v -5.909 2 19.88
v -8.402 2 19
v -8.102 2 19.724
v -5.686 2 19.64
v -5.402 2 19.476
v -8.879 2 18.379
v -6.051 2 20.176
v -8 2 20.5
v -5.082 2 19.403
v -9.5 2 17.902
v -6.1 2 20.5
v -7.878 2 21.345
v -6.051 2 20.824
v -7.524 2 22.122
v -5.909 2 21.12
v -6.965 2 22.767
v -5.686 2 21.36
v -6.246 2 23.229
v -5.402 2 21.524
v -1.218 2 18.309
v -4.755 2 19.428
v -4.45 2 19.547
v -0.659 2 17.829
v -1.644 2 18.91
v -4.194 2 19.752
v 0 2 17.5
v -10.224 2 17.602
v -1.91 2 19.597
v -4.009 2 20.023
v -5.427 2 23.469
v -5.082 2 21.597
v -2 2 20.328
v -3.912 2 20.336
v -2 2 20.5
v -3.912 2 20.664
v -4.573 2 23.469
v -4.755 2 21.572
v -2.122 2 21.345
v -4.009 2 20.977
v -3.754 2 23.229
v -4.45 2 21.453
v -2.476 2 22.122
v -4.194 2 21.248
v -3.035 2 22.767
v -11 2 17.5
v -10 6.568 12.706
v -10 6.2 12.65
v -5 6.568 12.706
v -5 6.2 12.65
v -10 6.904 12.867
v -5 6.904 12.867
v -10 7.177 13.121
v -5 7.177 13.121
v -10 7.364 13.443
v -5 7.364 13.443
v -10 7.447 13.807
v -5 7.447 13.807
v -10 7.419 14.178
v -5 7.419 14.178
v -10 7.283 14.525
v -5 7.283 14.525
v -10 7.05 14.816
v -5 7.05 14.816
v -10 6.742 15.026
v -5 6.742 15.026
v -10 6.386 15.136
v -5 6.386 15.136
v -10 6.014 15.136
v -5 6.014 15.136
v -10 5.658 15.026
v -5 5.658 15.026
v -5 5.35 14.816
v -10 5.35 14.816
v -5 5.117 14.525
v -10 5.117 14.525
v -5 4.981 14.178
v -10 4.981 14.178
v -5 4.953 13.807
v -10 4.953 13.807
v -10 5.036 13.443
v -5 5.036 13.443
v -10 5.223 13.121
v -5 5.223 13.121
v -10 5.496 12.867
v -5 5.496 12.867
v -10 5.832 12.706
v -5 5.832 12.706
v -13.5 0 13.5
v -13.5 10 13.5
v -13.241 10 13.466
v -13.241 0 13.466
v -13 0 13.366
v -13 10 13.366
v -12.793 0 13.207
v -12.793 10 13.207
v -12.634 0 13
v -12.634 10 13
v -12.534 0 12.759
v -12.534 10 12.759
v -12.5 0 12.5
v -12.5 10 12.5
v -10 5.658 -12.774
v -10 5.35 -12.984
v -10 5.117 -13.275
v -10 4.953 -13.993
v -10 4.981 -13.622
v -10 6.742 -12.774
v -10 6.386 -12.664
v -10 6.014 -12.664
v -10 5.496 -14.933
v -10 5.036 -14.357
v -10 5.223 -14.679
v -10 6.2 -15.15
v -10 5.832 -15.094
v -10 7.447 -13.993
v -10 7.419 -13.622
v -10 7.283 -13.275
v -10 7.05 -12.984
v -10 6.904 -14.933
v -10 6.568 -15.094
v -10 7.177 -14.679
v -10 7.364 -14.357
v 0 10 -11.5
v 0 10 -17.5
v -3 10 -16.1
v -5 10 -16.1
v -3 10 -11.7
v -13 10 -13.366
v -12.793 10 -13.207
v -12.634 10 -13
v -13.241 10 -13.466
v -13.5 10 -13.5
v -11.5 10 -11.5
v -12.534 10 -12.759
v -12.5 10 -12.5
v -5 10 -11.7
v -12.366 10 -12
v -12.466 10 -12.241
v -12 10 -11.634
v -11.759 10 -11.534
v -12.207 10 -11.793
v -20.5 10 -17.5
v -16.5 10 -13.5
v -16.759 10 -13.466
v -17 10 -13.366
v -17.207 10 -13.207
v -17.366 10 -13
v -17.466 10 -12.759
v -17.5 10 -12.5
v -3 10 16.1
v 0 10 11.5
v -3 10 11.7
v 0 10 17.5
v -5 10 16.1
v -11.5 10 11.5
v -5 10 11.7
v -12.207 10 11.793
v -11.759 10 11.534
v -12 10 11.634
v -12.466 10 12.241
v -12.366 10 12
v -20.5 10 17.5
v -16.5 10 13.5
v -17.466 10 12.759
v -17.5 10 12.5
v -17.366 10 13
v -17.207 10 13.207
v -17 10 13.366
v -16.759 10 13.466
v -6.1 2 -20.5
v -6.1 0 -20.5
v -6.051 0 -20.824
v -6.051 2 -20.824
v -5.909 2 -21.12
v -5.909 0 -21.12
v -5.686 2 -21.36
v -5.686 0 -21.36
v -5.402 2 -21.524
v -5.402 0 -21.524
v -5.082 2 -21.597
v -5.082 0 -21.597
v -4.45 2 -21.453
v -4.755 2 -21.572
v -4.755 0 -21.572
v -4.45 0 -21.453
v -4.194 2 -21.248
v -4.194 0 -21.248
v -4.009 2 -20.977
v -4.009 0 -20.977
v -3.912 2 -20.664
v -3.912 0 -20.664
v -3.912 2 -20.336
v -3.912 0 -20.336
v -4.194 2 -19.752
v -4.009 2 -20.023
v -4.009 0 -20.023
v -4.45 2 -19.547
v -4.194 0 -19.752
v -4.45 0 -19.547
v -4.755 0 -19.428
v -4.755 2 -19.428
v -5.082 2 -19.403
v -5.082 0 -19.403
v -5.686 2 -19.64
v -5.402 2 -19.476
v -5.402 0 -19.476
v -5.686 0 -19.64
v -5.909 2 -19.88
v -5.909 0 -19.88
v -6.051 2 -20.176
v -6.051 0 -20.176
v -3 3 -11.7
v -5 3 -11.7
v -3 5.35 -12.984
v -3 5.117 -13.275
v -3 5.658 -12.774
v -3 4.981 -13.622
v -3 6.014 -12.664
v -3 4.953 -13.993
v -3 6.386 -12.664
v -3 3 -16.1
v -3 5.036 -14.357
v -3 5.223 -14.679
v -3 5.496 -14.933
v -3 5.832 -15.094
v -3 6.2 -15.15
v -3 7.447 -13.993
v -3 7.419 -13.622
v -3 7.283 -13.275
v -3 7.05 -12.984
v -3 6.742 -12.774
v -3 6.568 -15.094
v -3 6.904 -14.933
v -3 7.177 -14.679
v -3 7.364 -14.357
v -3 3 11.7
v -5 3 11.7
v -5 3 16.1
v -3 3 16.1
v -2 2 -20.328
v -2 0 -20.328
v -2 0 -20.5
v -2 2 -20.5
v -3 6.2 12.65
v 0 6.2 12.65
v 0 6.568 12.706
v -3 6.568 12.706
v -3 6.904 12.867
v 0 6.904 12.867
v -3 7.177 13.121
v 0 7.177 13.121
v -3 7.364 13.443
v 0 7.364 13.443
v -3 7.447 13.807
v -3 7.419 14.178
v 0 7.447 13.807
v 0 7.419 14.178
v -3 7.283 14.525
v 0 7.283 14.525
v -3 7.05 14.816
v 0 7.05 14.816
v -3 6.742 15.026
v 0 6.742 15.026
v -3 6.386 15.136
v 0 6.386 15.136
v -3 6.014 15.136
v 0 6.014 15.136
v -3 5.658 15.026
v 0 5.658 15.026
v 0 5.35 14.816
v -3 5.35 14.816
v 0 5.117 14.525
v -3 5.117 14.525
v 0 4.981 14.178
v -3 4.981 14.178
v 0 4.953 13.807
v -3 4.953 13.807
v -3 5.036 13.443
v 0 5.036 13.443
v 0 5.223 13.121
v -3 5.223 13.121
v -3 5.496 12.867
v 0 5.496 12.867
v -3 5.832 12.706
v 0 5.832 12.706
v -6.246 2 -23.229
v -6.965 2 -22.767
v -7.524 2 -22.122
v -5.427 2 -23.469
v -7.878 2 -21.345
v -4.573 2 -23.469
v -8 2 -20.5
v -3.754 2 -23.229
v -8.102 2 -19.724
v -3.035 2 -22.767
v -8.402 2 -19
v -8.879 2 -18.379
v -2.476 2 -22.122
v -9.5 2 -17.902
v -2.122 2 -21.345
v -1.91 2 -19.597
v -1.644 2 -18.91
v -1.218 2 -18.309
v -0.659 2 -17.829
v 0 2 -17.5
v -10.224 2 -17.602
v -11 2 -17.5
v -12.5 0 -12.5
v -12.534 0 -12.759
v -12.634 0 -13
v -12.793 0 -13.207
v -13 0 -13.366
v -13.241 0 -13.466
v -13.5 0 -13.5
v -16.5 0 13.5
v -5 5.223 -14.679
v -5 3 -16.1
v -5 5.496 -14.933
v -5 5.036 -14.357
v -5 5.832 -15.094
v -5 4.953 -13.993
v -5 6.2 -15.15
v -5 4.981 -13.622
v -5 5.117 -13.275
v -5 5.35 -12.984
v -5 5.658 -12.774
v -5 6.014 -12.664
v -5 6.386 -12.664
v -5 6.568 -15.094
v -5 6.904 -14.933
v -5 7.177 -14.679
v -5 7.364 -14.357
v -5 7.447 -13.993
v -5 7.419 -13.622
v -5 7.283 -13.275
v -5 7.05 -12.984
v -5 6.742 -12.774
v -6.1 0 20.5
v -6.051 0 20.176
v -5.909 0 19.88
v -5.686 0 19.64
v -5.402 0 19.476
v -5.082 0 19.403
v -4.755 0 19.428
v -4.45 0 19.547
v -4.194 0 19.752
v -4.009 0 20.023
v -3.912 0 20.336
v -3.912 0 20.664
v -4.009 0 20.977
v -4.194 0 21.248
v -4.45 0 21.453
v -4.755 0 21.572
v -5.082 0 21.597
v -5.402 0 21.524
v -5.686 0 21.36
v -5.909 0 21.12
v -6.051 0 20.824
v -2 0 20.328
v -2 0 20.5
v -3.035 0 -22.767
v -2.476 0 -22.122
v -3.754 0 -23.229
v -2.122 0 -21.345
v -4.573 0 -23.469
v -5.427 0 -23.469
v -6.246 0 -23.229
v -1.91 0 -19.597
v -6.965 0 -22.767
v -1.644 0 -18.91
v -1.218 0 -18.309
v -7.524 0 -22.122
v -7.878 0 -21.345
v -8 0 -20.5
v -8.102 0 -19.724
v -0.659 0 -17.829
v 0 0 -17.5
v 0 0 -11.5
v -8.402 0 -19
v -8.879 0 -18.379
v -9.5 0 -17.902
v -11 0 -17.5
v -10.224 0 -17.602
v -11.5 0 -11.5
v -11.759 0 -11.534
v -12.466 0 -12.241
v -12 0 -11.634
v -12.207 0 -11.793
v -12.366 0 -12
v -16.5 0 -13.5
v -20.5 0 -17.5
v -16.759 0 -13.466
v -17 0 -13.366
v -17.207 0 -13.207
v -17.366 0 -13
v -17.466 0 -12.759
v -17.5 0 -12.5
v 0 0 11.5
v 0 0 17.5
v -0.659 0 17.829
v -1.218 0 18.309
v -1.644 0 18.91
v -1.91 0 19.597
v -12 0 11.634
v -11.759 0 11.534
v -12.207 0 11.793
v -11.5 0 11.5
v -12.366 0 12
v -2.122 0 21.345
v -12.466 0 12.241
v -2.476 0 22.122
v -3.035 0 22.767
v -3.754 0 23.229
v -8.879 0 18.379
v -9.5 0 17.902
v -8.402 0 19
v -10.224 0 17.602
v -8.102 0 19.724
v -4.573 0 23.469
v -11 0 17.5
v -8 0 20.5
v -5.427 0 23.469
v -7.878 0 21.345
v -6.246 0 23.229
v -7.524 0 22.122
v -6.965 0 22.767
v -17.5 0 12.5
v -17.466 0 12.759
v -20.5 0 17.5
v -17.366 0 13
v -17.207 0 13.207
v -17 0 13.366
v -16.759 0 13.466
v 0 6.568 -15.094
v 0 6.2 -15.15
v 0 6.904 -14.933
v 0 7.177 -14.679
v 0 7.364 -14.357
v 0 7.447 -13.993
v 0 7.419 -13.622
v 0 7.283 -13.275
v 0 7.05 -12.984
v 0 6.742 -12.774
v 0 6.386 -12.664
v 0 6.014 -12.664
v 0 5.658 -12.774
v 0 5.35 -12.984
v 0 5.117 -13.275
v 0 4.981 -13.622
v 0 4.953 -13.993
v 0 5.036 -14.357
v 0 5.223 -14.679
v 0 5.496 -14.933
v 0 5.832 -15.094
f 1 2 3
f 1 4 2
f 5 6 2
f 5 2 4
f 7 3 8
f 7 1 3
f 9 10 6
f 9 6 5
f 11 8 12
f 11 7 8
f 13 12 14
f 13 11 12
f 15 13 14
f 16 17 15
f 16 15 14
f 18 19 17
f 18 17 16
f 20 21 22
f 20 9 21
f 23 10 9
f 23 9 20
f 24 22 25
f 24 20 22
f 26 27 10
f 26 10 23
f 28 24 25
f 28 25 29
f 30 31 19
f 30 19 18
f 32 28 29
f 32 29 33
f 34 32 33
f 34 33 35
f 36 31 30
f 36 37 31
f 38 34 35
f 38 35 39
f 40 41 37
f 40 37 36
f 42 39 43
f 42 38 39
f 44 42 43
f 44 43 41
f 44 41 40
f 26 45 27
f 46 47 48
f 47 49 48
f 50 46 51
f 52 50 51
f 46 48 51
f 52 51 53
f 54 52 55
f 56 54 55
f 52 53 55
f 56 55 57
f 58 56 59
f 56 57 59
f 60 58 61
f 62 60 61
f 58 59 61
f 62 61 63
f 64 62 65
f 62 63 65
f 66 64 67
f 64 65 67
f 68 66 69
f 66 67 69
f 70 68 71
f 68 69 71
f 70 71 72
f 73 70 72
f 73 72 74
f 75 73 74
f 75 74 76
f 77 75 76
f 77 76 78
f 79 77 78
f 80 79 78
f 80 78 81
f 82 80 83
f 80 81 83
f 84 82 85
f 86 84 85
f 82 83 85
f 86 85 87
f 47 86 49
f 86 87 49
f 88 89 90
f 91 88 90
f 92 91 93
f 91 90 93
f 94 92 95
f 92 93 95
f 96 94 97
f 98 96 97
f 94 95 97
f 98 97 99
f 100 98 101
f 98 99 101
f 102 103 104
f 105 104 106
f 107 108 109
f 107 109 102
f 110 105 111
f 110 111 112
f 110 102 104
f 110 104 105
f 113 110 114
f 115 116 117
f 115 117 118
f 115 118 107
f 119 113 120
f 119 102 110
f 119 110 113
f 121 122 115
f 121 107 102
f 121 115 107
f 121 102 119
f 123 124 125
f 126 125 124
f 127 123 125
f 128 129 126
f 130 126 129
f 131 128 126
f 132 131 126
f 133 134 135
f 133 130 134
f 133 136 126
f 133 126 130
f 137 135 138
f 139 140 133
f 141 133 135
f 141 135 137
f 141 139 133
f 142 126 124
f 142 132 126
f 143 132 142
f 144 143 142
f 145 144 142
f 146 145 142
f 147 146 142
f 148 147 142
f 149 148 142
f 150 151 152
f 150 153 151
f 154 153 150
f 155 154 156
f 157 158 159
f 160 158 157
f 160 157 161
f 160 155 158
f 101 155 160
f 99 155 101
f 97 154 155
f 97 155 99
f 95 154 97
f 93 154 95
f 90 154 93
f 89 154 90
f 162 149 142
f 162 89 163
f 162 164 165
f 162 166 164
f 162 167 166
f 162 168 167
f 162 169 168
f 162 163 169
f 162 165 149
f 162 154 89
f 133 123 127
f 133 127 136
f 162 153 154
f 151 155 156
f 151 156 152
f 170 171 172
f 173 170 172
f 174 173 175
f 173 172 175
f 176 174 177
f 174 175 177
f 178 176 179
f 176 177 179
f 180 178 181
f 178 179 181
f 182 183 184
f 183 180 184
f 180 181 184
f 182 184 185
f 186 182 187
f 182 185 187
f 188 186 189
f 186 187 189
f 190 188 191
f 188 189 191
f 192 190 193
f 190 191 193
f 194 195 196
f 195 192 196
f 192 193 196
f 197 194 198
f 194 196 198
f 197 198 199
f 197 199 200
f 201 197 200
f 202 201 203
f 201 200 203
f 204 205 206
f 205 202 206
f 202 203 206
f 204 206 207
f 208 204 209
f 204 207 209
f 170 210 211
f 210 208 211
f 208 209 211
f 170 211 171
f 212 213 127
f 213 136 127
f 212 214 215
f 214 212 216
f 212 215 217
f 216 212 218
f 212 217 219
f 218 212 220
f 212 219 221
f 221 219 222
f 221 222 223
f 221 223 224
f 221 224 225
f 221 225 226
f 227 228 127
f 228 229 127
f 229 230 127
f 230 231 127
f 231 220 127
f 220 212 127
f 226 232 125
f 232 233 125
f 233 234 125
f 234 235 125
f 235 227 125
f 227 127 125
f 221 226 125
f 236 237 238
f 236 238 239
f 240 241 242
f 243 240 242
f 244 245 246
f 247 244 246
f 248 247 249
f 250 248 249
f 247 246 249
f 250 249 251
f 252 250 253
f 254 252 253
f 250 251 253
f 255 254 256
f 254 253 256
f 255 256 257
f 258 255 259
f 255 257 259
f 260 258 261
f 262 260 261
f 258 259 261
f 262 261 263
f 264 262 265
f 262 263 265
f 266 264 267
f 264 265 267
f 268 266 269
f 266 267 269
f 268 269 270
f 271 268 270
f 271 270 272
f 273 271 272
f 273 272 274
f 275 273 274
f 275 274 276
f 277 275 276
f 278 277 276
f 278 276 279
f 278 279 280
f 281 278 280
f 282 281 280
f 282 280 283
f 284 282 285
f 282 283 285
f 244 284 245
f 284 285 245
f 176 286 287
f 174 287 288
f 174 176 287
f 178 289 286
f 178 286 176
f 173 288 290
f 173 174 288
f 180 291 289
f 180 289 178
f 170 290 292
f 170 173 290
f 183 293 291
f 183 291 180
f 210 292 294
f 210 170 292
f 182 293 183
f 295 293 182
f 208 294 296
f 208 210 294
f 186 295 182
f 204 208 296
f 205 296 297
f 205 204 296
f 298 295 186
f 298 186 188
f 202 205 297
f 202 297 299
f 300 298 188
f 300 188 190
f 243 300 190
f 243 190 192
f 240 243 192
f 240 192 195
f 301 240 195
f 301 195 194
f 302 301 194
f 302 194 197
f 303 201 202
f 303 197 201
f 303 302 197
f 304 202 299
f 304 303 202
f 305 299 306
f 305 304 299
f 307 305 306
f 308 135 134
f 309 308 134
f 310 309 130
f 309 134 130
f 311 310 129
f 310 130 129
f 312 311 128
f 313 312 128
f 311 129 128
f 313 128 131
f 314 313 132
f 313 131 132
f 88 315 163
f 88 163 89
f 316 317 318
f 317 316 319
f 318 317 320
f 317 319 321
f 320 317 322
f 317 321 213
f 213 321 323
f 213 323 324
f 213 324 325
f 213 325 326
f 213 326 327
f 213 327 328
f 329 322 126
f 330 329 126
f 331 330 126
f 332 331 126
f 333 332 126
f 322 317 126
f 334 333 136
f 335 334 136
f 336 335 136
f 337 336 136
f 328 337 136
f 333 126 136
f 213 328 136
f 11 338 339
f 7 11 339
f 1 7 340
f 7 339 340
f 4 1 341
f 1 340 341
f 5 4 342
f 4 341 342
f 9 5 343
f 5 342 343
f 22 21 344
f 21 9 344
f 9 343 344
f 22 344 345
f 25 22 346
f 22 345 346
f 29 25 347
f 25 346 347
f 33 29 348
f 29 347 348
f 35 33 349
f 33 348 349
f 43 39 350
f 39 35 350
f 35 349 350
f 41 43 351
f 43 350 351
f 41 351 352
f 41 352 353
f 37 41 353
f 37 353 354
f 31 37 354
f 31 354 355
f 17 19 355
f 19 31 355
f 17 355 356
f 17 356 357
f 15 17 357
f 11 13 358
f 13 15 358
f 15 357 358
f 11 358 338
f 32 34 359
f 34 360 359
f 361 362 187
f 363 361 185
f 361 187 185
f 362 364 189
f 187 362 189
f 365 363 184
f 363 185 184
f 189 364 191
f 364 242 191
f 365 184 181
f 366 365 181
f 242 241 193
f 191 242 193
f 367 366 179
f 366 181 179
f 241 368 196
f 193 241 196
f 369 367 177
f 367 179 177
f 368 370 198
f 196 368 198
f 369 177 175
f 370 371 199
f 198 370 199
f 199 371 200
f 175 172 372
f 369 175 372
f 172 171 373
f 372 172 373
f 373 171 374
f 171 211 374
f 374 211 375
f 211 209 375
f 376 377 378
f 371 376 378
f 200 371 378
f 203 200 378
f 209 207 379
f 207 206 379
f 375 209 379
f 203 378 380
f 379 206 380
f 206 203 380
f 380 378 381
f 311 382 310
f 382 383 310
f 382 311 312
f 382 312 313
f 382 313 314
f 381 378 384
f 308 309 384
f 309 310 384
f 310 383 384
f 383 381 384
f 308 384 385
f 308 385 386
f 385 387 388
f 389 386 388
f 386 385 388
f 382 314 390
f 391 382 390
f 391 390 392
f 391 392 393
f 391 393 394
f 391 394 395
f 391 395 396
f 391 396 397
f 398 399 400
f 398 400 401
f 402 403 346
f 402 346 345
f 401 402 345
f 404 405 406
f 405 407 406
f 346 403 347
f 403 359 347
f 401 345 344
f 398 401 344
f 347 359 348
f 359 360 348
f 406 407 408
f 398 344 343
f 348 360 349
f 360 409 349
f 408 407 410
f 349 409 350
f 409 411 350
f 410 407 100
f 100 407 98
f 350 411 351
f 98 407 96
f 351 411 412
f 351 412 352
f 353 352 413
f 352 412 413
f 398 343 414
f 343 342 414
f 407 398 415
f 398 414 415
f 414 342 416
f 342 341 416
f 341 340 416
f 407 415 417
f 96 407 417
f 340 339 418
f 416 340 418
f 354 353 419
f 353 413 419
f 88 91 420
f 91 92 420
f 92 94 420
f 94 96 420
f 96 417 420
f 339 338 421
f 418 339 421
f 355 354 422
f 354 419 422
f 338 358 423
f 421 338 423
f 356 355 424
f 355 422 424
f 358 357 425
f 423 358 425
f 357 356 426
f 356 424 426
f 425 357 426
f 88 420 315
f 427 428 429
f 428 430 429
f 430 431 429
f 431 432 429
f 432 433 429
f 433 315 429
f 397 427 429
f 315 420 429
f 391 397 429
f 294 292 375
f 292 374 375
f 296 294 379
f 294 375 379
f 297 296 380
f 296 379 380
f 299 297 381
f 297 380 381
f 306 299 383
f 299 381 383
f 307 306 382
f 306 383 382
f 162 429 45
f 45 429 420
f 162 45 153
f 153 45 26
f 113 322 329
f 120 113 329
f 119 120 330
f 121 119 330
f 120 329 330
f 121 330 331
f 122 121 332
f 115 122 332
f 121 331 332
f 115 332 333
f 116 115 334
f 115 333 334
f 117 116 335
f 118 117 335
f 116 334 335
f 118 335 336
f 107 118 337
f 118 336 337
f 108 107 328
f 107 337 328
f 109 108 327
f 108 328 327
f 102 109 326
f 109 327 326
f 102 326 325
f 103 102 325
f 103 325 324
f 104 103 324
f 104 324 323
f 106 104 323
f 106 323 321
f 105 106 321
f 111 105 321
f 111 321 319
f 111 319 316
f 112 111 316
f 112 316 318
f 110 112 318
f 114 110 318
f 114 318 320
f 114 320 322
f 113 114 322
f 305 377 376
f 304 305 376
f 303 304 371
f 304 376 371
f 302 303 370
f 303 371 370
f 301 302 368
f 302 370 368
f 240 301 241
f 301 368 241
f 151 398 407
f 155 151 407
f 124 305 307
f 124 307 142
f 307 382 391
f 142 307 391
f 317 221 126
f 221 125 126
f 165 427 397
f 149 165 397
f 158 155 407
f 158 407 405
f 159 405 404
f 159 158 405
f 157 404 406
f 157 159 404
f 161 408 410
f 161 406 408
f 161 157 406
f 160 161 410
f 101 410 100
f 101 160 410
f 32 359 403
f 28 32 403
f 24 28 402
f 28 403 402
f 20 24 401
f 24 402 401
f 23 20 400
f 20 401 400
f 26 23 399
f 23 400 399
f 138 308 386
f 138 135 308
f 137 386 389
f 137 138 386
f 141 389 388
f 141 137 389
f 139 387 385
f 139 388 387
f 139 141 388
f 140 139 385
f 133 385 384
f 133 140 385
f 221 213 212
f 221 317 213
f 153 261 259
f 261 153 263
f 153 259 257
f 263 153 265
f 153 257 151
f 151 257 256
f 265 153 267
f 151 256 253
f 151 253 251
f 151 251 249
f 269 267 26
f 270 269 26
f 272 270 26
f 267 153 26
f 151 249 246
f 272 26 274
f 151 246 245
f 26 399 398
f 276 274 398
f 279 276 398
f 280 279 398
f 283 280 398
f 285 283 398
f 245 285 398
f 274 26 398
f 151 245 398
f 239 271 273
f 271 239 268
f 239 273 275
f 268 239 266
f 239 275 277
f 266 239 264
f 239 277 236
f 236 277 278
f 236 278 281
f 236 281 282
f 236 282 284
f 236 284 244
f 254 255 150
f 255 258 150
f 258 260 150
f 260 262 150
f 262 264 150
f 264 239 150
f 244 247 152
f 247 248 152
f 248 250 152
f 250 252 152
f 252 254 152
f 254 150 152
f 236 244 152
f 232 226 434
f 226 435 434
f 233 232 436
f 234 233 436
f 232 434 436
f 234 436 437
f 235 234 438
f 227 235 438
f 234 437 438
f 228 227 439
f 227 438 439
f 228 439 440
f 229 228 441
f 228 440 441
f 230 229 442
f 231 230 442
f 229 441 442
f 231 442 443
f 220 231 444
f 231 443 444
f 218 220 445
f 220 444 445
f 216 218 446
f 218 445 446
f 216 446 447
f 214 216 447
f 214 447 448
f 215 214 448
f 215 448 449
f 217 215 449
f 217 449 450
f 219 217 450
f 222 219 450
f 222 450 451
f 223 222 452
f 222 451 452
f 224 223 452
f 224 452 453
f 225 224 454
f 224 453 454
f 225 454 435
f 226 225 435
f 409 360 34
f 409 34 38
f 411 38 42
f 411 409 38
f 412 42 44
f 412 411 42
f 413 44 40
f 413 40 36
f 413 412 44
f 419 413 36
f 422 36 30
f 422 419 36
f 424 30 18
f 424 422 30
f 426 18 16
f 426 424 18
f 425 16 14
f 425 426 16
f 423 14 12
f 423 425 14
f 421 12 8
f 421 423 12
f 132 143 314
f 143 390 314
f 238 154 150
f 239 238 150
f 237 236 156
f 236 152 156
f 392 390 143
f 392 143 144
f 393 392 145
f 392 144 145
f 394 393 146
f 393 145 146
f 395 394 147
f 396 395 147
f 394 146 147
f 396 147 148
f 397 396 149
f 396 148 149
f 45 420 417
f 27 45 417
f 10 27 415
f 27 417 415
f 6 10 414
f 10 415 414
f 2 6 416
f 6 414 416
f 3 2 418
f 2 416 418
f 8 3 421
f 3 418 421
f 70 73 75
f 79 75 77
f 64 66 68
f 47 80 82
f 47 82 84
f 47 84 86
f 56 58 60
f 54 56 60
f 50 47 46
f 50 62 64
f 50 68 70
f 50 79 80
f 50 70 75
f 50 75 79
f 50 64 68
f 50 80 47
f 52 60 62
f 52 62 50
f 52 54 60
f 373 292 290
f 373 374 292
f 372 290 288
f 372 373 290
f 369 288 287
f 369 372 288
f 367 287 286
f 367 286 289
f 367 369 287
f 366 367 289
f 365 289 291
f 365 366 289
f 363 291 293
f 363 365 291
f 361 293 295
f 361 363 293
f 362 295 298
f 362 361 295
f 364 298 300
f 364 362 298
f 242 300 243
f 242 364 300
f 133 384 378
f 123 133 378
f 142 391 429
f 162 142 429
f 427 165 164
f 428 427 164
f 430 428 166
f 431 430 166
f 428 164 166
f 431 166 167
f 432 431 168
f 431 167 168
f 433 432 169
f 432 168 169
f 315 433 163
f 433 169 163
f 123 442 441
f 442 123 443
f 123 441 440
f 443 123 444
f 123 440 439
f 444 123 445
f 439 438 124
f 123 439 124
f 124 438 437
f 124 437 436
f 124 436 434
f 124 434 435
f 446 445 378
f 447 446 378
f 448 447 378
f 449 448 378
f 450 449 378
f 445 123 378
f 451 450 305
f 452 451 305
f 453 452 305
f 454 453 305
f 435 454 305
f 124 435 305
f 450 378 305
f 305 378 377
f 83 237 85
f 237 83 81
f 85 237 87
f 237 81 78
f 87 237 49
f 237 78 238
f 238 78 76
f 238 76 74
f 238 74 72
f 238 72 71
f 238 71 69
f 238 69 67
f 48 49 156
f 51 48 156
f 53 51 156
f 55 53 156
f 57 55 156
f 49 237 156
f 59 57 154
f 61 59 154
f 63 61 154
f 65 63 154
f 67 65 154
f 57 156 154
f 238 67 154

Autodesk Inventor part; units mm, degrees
ref_plane "YZ Plane" through (0, 0, 0) normal (1, 0, 0) x (0, 1, 0)
ref_plane "XZ Plane" through (0, 0, 0) normal (0, 1, 0) x (-1, 0, 0)
ref_plane "XY Plane" through (0, 0, 0) normal (0, 0, 1) x (1, 0, 0)
sketch "Sketch1" plane through (0, 0, 0) normal (0, 1, 0) x (-1, 0, 0)
  line L0 (0, 17.5) -> (0, 11.5)
  line L1 (0, 11.5) -> (17.5, 11.5)
  line L2 (17.5, 11.5) -> (17.5, 0)
  line L3 (17.5, 0) -> (17.5, -11.5)
  line L4 (17.5, -11.5) -> (0, -11.5)
  line L5 (0, -11.5) -> (0, -17.5)
  line L6 (0, -17.5) -> (20.5, -17.5)
  line L7 (20.5, -17.5) -> (20.5, 17.5)
  line L8 (20.5, 17.5) -> (0, 17.5)
  line L9 (0, 0) -> (0, 11.5) construction
  line L10 (0, 0) -> (0, -11.5) construction
  line L11 (8, 17.5) -> (8, 23.5)
  line L12 (8, 23.5) -> (2, 23.5)
  line L13 (2, 23.5) -> (2, 17.5)
  line L14 (2, -17.5) -> (2, -23.5)
  line L15 (2, -23.5) -> (8, -23.5)
  line L16 (8, -23.5) -> (8, -17.5)
  circle A0 centre (5, 20.5) radius 1.1
  circle A1 centre (5, -20.5) radius 1.1
  line L17 (5, 20.5) -> (5, 23.5) construction
  line L18 (5, -20.5) -> (5, -23.5) construction
  line L19 (5, -20.5) -> (5, 20.5) construction
  line L20 (17.5, 11.5) -> (17.5, 13.5)
  line L21 (17.5, 13.5) -> (12.5, 13.5)
  line L22 (12.5, 13.5) -> (12.5, 11.5)
  line L23 (17.5, -11.5) -> (17.5, -13.5)
  line L24 (17.5, -13.5) -> (12.5, -13.5)
  line L25 (12.5, -13.5) -> (12.5, -11.5)
  dimension "d0" = 23
  dimension "d1" = 17.5
  dimension "d2" = 3
  dimension "d4" = 6
  dimension "d16" = 2.2
  dimension "d17" = 2.2
  dimension "d18" = 3
  dimension "d19" = 3
  dimension "d24" = 41
  dimension "d26" = 5
  dimension "d27" = 5
  dimension "d28" = 2
extrude "Extrusion1" add sketch "Sketch1" along normal blind 10 contours L8 L7 L6 L5 L4 L25 L24 L23 L3 L2 L20 L21 L22 L1 L0
sketch "Sketch2" plane through (0, 0, 17.5) normal (1, 0, 0) x (0, 0, -1)
  line L0 (6, 0) -> (6, 10) projected
  line L1 (0, 10) -> (6, 10) projected
  line L2 (0, 0) -> (0, 10) projected
  line L3 (35, 0) -> (35, 10) projected
  line L4 (29, 10) -> (35, 10) projected
  line L5 (29, 0) -> (29, 10) projected
  circle A0 centre (3.6, 6.2) radius 1.25
  circle A1 centre (31.4, 6.2) radius 1.25
  line L6 (3.6, 6.2) -> (3.6, 0) construction
  line L7 (31.4, 6.2) -> (31.4, 0) construction
  line L8 (6, 0) -> (3.6, 0) construction
  line L9 (29, 0) -> (31.4, 0) construction
  line L10 (3.6, 6.2) -> (6, 6.2) construction
  line L11 (31.4, 6.2) -> (29, 6.2) construction
  point P0 (17.5, 0)
  dimension "d7" = 2.5
  dimension "d31" = 27.8
  dimension "d33" = 6.2
extrude "Extrusion2" cut sketch "Sketch2" against normal blind 10
sketch "Sketch3" plane through (0, 10, 0) normal (0, 1, 0) x (1, 0, 0)
  line L0 (0, -11.5) -> (-12.5, -11.5) projected
  line L1 (-17.5, -13.5) -> (-17.5, 13.5) projected
  line L2 (-12.5, 11.5) -> (0, 11.5) projected
  line L3 (0, 17.5) -> (-20.5, 17.5) projected
  line L4 (-20.5, 17.5) -> (-20.5, -17.5) projected
  line L5 (-20.5, -17.5) -> (0, -17.5) projected
  line L6 (-3, -11.7) -> (-5, -11.7)
  line L7 (-5, -11.7) -> (-5, -16.1)
  line L8 (-5, -16.1) -> (-3, -16.1)
  line L9 (-3, -16.1) -> (-3, -11.7)
  line L10 (-3, -11.7) -> (-5, -16.1) construction
  line L11 (-5, -11.7) -> (-3, -16.1) construction
  line L12 (-3, 16.1) -> (-5, 16.1)
  line L13 (-5, 16.1) -> (-5, 11.7)
  line L14 (-5, 11.7) -> (-3, 11.7)
  line L15 (-3, 11.7) -> (-3, 16.1)
  line L16 (-3, 16.1) -> (-5, 11.7) construction
  line L17 (-5, 16.1) -> (-3, 11.7) construction
  line L18 (-12.5, -11.5) -> (-12.5, -13.5) projected
  line L19 (-12.5, -13.5) -> (-17.5, -13.5) projected
  line L20 (-17.5, 13.5) -> (-12.5, 13.5) projected
  line L21 (-12.5, 13.5) -> (-12.5, 11.5) projected
  line L22 (0, -12.65) -> (0, -15.15) projected
  line L23 (0, 15.15) -> (0, 12.65) projected
  line L24 (0, 13.9) -> (-3, 13.9) construction
  line L25 (-3, -13.9) -> (0, -13.9) construction
  point P0 (0, 0)
  dimension "d11" = 4.4
  dimension "d13" = 2
  dimension "d34" = 3
extrude "Extrusion3" cut sketch "Sketch3" against normal blind 7
extrude "Extrusion4" add sketch "Sketch1" along normal blind 2 contours L13 L12 L11 L8 | L16 L15 L14 L6
fillet "Fillet1" radius 3 8 edges at (-2, 1, 17.5) (-2, 1, -17.5) (-8, 1, 17.5) (-8, 1, -17.5) (-2, 1, 23.5) (-8, 1, 23.5) (-8, 1, -23.5) (-2, 1, -23.5)
fillet "Fillet2" radius 1 6 edges at (-17.5, 5, 13.5) (-12.5, 5, 13.5) (-12.5, 5, 11.5) (-17.5, 5, -13.5) (-12.5, 5, -13.5) (-12.5, 5, -11.5)
properties part number "Servo Holder_3DPrint"
